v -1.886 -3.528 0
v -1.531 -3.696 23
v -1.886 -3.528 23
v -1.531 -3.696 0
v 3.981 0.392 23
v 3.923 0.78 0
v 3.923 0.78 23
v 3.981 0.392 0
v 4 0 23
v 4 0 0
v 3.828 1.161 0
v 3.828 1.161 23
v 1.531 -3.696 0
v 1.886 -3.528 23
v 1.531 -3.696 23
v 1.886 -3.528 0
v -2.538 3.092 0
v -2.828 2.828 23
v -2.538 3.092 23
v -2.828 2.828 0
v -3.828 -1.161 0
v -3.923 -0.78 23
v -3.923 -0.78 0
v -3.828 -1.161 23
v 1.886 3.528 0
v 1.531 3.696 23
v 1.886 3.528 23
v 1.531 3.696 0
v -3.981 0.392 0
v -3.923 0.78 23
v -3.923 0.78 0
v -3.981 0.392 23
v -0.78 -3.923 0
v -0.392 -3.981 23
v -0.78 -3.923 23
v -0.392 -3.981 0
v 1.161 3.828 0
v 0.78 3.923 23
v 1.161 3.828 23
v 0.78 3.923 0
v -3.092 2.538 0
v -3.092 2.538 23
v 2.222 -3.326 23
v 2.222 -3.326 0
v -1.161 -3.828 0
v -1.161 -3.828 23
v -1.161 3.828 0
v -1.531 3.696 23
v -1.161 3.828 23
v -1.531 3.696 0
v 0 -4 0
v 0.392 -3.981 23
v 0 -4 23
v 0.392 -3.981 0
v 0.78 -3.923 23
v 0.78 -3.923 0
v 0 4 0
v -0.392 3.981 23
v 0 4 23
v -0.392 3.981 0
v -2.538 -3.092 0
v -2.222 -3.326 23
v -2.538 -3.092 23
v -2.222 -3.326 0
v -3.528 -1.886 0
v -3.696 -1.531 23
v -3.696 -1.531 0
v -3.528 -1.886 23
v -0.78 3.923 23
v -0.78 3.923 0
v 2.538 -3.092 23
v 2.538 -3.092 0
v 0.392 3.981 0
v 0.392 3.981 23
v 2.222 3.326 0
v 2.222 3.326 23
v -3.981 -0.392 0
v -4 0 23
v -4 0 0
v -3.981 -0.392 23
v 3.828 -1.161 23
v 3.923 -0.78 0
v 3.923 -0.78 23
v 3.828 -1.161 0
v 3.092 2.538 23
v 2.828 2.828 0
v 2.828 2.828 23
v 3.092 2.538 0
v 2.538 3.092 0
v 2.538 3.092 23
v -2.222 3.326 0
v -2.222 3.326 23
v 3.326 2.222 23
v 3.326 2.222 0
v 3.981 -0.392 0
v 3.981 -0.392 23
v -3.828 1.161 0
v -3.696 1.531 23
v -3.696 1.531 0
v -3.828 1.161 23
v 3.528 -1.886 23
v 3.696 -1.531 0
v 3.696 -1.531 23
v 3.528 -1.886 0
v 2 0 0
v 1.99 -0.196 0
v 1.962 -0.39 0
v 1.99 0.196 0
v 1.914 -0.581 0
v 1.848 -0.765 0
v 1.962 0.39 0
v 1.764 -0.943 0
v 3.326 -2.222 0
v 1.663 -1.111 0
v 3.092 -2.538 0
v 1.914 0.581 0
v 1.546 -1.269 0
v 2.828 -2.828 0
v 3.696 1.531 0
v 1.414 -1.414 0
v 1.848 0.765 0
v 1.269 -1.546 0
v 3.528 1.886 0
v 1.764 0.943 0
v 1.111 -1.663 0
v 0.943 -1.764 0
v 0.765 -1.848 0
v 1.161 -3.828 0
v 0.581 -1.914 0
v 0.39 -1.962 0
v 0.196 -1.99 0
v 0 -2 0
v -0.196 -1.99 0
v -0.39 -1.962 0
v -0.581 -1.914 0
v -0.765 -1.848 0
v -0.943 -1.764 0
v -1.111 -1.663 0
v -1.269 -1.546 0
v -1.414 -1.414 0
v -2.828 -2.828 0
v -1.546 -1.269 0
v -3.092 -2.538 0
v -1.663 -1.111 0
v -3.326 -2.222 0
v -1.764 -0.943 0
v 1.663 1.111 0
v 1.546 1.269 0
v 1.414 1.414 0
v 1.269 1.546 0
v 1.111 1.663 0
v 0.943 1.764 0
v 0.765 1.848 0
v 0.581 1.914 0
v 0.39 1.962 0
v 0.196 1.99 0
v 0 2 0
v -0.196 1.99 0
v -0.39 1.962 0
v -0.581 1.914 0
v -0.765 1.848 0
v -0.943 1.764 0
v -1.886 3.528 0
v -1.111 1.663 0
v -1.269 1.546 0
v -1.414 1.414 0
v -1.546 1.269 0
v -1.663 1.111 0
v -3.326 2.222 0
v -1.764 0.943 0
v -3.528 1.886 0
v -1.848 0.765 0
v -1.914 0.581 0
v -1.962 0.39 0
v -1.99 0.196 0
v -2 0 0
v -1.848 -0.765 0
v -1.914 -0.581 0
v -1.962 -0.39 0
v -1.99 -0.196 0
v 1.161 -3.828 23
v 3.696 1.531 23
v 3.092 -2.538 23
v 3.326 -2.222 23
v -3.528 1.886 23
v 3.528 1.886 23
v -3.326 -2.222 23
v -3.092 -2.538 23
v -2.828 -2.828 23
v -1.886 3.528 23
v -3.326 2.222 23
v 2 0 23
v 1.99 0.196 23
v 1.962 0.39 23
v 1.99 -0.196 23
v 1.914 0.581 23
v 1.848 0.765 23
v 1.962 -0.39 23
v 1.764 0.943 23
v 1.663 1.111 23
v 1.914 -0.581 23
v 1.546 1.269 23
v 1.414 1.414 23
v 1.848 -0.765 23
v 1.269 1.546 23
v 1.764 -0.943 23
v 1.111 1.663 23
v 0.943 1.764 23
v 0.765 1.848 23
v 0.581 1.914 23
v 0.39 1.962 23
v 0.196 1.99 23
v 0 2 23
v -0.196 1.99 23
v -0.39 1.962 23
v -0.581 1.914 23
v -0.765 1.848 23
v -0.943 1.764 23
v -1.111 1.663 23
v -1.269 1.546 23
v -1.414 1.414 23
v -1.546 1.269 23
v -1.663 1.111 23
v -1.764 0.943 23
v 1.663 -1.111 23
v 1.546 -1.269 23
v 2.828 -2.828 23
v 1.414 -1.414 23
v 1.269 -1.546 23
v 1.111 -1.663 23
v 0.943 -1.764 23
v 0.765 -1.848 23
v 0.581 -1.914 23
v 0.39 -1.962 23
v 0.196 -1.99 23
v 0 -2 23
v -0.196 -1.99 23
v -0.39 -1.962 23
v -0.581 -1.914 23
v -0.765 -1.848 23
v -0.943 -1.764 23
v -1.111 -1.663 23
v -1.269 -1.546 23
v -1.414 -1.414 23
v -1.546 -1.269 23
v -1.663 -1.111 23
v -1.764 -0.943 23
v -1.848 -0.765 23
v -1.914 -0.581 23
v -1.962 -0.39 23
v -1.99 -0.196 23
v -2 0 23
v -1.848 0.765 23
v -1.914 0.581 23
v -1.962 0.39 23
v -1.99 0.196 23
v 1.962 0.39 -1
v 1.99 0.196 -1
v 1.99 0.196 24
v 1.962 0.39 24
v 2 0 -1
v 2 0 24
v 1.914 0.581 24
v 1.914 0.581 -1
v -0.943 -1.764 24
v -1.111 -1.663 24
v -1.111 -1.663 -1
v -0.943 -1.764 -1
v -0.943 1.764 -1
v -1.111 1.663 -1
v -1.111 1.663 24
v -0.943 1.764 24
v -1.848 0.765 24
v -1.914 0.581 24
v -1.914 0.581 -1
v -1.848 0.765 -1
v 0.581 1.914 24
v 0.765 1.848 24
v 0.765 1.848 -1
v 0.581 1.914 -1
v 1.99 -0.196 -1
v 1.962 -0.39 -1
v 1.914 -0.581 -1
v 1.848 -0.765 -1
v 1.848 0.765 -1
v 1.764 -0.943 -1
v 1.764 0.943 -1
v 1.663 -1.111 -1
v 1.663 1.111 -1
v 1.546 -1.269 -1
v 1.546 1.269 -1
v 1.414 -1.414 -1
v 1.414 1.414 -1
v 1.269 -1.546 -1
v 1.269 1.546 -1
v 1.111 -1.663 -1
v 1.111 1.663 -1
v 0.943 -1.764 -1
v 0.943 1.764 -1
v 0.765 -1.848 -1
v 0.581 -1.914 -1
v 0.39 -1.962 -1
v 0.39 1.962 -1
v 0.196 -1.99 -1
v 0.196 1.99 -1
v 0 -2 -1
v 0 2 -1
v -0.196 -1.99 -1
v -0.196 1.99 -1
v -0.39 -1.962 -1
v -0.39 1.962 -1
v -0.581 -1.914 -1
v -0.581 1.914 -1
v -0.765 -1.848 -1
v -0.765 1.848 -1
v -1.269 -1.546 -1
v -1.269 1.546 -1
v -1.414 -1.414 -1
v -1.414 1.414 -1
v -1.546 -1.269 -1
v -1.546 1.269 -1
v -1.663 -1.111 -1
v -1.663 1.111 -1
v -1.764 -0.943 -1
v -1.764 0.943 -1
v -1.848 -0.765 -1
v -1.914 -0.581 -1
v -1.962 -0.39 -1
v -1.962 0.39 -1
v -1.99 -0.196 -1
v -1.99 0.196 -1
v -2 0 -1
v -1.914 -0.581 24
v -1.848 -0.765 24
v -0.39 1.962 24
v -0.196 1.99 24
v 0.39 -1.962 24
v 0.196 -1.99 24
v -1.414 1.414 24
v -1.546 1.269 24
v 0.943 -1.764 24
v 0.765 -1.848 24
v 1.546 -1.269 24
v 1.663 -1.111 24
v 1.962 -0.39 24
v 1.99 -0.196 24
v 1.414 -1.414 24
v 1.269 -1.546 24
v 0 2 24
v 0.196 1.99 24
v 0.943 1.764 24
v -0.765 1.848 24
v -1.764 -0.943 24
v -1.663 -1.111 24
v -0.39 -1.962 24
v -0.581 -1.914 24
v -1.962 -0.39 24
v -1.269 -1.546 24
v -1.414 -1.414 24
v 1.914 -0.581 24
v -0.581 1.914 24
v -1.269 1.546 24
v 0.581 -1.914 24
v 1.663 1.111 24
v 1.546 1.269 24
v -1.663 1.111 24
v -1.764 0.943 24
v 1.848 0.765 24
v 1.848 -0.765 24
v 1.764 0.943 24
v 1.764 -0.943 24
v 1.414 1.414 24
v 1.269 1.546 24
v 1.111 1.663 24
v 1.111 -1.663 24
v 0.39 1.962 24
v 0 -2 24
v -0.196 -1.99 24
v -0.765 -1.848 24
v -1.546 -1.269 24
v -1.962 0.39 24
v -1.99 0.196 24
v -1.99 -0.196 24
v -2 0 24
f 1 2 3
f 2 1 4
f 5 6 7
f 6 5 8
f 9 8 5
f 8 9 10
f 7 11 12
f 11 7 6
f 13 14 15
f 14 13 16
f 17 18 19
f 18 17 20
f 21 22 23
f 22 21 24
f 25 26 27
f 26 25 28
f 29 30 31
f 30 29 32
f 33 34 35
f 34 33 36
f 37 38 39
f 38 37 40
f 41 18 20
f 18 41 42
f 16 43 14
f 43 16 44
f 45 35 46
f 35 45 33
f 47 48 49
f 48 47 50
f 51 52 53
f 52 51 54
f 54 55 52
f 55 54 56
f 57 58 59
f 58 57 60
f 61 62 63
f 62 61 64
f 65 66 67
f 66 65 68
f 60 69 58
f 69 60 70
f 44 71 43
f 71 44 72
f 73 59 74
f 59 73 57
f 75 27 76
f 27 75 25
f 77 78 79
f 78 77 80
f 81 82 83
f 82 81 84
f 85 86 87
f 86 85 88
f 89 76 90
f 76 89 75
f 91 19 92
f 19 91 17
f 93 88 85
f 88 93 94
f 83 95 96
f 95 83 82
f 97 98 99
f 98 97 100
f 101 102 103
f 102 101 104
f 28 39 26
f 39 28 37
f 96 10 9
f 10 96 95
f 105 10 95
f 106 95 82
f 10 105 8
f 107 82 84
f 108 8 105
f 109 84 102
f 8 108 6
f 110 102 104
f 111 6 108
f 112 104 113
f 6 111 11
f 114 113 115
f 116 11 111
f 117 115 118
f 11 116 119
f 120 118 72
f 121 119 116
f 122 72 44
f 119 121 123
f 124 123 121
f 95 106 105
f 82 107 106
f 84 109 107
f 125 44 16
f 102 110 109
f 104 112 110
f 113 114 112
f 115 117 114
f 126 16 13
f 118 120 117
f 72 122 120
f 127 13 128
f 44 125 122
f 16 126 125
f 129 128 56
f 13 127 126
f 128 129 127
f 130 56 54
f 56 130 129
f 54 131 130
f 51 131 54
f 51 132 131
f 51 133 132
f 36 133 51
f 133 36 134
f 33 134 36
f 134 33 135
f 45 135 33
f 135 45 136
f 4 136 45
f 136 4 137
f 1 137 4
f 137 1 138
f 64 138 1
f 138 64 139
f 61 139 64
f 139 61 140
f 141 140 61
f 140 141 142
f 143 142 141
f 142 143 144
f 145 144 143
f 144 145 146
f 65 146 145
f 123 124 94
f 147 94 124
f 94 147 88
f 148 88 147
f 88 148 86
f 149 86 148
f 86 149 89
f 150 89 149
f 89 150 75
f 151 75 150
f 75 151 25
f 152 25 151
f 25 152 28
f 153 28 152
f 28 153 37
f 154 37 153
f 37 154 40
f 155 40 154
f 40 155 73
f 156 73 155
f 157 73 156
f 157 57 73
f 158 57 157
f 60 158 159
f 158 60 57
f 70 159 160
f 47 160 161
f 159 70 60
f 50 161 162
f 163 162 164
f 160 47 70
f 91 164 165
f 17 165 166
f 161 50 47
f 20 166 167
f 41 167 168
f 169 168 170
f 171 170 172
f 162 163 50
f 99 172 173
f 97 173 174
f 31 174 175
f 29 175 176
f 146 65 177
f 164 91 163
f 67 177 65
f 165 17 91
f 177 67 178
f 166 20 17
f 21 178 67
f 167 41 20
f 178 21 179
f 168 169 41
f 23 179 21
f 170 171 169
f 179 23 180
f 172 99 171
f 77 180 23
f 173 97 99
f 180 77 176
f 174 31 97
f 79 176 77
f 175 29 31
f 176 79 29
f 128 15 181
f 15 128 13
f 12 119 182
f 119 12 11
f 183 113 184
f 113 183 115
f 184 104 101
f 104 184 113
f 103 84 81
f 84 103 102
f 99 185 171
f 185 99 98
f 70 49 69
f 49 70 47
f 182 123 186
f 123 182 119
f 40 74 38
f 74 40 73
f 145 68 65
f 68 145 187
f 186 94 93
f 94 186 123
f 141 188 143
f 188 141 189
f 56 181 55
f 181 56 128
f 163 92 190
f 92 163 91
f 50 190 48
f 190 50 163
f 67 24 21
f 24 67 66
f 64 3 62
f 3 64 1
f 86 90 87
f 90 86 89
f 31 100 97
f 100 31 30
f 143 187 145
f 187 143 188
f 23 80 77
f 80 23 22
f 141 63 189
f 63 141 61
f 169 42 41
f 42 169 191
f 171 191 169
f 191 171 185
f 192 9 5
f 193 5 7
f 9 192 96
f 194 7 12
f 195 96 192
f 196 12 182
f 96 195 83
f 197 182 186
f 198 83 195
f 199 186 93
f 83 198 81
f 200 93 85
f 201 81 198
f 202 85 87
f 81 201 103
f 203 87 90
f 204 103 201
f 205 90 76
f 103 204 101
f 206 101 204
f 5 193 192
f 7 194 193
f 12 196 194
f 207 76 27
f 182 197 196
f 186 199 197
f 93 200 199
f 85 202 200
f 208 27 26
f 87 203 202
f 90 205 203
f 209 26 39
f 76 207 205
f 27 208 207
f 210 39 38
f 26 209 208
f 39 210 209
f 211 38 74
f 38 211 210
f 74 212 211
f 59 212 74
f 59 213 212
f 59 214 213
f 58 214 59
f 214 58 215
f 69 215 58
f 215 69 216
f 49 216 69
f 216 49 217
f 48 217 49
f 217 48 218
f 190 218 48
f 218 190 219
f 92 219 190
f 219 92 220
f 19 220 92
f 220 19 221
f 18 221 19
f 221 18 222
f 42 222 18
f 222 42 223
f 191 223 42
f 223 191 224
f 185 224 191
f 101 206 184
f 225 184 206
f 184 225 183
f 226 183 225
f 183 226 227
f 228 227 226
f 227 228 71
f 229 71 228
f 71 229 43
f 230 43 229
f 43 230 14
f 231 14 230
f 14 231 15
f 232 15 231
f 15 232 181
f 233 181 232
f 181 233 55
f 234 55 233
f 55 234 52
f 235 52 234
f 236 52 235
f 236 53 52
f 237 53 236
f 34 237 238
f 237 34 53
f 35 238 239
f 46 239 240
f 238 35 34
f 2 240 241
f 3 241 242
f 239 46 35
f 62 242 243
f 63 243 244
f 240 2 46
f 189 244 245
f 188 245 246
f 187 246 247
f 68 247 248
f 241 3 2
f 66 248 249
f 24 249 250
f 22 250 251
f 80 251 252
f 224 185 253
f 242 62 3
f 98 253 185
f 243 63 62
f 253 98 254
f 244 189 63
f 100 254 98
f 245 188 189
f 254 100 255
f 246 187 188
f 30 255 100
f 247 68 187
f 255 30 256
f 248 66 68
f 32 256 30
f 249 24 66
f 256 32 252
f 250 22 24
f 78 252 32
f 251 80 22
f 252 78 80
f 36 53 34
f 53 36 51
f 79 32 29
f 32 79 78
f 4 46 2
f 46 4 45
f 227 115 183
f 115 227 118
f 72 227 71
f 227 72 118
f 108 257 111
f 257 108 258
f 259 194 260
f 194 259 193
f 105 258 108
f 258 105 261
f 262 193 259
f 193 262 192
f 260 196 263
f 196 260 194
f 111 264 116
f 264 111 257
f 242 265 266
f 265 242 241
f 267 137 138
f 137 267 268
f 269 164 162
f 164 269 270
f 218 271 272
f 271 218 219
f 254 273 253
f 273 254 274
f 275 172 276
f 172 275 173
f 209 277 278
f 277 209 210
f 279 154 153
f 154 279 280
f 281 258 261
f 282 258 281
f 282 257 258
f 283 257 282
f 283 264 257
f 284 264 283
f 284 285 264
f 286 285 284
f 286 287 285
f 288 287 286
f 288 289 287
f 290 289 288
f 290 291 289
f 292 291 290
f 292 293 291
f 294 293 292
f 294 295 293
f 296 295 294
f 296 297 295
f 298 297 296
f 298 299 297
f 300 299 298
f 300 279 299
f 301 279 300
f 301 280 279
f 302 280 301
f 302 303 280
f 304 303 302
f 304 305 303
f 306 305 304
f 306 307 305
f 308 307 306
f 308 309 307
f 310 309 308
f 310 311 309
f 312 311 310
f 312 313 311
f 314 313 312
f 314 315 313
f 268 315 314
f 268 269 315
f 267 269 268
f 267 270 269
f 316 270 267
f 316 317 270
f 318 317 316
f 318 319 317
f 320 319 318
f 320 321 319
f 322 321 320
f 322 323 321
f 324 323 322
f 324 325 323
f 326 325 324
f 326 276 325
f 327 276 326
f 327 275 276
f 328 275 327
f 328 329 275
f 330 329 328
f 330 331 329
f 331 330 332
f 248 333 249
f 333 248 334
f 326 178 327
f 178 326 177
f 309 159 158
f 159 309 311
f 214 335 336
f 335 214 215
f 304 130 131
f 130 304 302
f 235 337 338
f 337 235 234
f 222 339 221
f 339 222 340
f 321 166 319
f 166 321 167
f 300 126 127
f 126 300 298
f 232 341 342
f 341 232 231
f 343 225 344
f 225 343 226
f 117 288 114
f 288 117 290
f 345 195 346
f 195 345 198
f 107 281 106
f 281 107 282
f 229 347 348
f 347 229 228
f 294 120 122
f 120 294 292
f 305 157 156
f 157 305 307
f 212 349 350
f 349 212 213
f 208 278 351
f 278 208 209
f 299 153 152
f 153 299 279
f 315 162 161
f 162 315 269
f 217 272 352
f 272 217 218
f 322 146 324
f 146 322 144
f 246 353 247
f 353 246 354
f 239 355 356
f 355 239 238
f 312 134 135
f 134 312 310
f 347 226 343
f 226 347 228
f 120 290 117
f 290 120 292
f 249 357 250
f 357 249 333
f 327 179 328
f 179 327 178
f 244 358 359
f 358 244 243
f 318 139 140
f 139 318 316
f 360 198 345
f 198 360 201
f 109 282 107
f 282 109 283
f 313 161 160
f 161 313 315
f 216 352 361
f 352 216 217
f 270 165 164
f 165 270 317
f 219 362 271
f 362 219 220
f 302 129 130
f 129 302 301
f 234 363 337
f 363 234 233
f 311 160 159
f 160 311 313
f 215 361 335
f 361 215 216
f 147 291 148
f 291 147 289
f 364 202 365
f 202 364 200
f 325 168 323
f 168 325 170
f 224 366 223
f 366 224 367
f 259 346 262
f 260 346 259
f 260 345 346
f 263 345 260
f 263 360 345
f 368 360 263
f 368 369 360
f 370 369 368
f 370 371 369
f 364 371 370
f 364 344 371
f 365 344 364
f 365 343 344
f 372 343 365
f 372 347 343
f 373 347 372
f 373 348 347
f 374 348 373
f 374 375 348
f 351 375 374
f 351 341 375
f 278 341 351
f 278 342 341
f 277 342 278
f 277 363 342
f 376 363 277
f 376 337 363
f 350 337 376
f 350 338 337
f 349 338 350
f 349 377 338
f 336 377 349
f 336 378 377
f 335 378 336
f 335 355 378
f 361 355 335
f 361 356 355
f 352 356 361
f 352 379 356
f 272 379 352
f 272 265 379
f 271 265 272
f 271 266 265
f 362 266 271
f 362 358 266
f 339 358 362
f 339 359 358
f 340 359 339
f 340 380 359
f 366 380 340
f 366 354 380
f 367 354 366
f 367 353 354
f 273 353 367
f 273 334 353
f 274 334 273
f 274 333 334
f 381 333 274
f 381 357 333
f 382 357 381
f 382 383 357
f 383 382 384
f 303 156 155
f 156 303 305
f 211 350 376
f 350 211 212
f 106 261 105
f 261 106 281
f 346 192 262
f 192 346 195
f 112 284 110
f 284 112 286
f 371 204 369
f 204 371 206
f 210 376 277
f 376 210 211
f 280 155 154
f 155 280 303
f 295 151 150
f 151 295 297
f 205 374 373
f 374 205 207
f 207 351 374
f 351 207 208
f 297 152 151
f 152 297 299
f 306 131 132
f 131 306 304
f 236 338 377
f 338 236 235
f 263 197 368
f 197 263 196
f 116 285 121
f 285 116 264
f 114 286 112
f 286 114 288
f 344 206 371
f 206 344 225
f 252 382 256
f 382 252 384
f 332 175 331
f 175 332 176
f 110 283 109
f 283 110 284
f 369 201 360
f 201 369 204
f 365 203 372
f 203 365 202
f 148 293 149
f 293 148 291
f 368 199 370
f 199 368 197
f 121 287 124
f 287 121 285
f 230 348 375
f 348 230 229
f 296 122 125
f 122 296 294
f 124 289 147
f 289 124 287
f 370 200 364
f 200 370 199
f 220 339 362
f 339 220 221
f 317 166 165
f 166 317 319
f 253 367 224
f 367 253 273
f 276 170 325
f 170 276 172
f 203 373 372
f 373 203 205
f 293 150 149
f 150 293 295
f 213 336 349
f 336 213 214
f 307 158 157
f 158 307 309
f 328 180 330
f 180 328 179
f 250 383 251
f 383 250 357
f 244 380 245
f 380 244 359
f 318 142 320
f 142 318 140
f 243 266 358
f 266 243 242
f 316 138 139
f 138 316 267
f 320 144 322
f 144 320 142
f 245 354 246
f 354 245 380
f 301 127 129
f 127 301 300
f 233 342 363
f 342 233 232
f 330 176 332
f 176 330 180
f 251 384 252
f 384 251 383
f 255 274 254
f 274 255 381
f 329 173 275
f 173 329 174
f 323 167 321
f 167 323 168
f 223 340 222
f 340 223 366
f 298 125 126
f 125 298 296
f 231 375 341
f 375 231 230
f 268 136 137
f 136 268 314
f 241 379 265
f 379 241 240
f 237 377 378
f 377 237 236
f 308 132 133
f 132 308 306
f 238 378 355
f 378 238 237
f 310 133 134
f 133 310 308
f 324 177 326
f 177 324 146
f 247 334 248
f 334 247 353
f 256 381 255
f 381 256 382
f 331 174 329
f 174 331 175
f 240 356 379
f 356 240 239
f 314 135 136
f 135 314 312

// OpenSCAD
cylinder(h=23.0, d=8.0, $fn=64);
translate([0, 0, -1])
cylinder(h=25.0, d=4.0, $fn=64);
